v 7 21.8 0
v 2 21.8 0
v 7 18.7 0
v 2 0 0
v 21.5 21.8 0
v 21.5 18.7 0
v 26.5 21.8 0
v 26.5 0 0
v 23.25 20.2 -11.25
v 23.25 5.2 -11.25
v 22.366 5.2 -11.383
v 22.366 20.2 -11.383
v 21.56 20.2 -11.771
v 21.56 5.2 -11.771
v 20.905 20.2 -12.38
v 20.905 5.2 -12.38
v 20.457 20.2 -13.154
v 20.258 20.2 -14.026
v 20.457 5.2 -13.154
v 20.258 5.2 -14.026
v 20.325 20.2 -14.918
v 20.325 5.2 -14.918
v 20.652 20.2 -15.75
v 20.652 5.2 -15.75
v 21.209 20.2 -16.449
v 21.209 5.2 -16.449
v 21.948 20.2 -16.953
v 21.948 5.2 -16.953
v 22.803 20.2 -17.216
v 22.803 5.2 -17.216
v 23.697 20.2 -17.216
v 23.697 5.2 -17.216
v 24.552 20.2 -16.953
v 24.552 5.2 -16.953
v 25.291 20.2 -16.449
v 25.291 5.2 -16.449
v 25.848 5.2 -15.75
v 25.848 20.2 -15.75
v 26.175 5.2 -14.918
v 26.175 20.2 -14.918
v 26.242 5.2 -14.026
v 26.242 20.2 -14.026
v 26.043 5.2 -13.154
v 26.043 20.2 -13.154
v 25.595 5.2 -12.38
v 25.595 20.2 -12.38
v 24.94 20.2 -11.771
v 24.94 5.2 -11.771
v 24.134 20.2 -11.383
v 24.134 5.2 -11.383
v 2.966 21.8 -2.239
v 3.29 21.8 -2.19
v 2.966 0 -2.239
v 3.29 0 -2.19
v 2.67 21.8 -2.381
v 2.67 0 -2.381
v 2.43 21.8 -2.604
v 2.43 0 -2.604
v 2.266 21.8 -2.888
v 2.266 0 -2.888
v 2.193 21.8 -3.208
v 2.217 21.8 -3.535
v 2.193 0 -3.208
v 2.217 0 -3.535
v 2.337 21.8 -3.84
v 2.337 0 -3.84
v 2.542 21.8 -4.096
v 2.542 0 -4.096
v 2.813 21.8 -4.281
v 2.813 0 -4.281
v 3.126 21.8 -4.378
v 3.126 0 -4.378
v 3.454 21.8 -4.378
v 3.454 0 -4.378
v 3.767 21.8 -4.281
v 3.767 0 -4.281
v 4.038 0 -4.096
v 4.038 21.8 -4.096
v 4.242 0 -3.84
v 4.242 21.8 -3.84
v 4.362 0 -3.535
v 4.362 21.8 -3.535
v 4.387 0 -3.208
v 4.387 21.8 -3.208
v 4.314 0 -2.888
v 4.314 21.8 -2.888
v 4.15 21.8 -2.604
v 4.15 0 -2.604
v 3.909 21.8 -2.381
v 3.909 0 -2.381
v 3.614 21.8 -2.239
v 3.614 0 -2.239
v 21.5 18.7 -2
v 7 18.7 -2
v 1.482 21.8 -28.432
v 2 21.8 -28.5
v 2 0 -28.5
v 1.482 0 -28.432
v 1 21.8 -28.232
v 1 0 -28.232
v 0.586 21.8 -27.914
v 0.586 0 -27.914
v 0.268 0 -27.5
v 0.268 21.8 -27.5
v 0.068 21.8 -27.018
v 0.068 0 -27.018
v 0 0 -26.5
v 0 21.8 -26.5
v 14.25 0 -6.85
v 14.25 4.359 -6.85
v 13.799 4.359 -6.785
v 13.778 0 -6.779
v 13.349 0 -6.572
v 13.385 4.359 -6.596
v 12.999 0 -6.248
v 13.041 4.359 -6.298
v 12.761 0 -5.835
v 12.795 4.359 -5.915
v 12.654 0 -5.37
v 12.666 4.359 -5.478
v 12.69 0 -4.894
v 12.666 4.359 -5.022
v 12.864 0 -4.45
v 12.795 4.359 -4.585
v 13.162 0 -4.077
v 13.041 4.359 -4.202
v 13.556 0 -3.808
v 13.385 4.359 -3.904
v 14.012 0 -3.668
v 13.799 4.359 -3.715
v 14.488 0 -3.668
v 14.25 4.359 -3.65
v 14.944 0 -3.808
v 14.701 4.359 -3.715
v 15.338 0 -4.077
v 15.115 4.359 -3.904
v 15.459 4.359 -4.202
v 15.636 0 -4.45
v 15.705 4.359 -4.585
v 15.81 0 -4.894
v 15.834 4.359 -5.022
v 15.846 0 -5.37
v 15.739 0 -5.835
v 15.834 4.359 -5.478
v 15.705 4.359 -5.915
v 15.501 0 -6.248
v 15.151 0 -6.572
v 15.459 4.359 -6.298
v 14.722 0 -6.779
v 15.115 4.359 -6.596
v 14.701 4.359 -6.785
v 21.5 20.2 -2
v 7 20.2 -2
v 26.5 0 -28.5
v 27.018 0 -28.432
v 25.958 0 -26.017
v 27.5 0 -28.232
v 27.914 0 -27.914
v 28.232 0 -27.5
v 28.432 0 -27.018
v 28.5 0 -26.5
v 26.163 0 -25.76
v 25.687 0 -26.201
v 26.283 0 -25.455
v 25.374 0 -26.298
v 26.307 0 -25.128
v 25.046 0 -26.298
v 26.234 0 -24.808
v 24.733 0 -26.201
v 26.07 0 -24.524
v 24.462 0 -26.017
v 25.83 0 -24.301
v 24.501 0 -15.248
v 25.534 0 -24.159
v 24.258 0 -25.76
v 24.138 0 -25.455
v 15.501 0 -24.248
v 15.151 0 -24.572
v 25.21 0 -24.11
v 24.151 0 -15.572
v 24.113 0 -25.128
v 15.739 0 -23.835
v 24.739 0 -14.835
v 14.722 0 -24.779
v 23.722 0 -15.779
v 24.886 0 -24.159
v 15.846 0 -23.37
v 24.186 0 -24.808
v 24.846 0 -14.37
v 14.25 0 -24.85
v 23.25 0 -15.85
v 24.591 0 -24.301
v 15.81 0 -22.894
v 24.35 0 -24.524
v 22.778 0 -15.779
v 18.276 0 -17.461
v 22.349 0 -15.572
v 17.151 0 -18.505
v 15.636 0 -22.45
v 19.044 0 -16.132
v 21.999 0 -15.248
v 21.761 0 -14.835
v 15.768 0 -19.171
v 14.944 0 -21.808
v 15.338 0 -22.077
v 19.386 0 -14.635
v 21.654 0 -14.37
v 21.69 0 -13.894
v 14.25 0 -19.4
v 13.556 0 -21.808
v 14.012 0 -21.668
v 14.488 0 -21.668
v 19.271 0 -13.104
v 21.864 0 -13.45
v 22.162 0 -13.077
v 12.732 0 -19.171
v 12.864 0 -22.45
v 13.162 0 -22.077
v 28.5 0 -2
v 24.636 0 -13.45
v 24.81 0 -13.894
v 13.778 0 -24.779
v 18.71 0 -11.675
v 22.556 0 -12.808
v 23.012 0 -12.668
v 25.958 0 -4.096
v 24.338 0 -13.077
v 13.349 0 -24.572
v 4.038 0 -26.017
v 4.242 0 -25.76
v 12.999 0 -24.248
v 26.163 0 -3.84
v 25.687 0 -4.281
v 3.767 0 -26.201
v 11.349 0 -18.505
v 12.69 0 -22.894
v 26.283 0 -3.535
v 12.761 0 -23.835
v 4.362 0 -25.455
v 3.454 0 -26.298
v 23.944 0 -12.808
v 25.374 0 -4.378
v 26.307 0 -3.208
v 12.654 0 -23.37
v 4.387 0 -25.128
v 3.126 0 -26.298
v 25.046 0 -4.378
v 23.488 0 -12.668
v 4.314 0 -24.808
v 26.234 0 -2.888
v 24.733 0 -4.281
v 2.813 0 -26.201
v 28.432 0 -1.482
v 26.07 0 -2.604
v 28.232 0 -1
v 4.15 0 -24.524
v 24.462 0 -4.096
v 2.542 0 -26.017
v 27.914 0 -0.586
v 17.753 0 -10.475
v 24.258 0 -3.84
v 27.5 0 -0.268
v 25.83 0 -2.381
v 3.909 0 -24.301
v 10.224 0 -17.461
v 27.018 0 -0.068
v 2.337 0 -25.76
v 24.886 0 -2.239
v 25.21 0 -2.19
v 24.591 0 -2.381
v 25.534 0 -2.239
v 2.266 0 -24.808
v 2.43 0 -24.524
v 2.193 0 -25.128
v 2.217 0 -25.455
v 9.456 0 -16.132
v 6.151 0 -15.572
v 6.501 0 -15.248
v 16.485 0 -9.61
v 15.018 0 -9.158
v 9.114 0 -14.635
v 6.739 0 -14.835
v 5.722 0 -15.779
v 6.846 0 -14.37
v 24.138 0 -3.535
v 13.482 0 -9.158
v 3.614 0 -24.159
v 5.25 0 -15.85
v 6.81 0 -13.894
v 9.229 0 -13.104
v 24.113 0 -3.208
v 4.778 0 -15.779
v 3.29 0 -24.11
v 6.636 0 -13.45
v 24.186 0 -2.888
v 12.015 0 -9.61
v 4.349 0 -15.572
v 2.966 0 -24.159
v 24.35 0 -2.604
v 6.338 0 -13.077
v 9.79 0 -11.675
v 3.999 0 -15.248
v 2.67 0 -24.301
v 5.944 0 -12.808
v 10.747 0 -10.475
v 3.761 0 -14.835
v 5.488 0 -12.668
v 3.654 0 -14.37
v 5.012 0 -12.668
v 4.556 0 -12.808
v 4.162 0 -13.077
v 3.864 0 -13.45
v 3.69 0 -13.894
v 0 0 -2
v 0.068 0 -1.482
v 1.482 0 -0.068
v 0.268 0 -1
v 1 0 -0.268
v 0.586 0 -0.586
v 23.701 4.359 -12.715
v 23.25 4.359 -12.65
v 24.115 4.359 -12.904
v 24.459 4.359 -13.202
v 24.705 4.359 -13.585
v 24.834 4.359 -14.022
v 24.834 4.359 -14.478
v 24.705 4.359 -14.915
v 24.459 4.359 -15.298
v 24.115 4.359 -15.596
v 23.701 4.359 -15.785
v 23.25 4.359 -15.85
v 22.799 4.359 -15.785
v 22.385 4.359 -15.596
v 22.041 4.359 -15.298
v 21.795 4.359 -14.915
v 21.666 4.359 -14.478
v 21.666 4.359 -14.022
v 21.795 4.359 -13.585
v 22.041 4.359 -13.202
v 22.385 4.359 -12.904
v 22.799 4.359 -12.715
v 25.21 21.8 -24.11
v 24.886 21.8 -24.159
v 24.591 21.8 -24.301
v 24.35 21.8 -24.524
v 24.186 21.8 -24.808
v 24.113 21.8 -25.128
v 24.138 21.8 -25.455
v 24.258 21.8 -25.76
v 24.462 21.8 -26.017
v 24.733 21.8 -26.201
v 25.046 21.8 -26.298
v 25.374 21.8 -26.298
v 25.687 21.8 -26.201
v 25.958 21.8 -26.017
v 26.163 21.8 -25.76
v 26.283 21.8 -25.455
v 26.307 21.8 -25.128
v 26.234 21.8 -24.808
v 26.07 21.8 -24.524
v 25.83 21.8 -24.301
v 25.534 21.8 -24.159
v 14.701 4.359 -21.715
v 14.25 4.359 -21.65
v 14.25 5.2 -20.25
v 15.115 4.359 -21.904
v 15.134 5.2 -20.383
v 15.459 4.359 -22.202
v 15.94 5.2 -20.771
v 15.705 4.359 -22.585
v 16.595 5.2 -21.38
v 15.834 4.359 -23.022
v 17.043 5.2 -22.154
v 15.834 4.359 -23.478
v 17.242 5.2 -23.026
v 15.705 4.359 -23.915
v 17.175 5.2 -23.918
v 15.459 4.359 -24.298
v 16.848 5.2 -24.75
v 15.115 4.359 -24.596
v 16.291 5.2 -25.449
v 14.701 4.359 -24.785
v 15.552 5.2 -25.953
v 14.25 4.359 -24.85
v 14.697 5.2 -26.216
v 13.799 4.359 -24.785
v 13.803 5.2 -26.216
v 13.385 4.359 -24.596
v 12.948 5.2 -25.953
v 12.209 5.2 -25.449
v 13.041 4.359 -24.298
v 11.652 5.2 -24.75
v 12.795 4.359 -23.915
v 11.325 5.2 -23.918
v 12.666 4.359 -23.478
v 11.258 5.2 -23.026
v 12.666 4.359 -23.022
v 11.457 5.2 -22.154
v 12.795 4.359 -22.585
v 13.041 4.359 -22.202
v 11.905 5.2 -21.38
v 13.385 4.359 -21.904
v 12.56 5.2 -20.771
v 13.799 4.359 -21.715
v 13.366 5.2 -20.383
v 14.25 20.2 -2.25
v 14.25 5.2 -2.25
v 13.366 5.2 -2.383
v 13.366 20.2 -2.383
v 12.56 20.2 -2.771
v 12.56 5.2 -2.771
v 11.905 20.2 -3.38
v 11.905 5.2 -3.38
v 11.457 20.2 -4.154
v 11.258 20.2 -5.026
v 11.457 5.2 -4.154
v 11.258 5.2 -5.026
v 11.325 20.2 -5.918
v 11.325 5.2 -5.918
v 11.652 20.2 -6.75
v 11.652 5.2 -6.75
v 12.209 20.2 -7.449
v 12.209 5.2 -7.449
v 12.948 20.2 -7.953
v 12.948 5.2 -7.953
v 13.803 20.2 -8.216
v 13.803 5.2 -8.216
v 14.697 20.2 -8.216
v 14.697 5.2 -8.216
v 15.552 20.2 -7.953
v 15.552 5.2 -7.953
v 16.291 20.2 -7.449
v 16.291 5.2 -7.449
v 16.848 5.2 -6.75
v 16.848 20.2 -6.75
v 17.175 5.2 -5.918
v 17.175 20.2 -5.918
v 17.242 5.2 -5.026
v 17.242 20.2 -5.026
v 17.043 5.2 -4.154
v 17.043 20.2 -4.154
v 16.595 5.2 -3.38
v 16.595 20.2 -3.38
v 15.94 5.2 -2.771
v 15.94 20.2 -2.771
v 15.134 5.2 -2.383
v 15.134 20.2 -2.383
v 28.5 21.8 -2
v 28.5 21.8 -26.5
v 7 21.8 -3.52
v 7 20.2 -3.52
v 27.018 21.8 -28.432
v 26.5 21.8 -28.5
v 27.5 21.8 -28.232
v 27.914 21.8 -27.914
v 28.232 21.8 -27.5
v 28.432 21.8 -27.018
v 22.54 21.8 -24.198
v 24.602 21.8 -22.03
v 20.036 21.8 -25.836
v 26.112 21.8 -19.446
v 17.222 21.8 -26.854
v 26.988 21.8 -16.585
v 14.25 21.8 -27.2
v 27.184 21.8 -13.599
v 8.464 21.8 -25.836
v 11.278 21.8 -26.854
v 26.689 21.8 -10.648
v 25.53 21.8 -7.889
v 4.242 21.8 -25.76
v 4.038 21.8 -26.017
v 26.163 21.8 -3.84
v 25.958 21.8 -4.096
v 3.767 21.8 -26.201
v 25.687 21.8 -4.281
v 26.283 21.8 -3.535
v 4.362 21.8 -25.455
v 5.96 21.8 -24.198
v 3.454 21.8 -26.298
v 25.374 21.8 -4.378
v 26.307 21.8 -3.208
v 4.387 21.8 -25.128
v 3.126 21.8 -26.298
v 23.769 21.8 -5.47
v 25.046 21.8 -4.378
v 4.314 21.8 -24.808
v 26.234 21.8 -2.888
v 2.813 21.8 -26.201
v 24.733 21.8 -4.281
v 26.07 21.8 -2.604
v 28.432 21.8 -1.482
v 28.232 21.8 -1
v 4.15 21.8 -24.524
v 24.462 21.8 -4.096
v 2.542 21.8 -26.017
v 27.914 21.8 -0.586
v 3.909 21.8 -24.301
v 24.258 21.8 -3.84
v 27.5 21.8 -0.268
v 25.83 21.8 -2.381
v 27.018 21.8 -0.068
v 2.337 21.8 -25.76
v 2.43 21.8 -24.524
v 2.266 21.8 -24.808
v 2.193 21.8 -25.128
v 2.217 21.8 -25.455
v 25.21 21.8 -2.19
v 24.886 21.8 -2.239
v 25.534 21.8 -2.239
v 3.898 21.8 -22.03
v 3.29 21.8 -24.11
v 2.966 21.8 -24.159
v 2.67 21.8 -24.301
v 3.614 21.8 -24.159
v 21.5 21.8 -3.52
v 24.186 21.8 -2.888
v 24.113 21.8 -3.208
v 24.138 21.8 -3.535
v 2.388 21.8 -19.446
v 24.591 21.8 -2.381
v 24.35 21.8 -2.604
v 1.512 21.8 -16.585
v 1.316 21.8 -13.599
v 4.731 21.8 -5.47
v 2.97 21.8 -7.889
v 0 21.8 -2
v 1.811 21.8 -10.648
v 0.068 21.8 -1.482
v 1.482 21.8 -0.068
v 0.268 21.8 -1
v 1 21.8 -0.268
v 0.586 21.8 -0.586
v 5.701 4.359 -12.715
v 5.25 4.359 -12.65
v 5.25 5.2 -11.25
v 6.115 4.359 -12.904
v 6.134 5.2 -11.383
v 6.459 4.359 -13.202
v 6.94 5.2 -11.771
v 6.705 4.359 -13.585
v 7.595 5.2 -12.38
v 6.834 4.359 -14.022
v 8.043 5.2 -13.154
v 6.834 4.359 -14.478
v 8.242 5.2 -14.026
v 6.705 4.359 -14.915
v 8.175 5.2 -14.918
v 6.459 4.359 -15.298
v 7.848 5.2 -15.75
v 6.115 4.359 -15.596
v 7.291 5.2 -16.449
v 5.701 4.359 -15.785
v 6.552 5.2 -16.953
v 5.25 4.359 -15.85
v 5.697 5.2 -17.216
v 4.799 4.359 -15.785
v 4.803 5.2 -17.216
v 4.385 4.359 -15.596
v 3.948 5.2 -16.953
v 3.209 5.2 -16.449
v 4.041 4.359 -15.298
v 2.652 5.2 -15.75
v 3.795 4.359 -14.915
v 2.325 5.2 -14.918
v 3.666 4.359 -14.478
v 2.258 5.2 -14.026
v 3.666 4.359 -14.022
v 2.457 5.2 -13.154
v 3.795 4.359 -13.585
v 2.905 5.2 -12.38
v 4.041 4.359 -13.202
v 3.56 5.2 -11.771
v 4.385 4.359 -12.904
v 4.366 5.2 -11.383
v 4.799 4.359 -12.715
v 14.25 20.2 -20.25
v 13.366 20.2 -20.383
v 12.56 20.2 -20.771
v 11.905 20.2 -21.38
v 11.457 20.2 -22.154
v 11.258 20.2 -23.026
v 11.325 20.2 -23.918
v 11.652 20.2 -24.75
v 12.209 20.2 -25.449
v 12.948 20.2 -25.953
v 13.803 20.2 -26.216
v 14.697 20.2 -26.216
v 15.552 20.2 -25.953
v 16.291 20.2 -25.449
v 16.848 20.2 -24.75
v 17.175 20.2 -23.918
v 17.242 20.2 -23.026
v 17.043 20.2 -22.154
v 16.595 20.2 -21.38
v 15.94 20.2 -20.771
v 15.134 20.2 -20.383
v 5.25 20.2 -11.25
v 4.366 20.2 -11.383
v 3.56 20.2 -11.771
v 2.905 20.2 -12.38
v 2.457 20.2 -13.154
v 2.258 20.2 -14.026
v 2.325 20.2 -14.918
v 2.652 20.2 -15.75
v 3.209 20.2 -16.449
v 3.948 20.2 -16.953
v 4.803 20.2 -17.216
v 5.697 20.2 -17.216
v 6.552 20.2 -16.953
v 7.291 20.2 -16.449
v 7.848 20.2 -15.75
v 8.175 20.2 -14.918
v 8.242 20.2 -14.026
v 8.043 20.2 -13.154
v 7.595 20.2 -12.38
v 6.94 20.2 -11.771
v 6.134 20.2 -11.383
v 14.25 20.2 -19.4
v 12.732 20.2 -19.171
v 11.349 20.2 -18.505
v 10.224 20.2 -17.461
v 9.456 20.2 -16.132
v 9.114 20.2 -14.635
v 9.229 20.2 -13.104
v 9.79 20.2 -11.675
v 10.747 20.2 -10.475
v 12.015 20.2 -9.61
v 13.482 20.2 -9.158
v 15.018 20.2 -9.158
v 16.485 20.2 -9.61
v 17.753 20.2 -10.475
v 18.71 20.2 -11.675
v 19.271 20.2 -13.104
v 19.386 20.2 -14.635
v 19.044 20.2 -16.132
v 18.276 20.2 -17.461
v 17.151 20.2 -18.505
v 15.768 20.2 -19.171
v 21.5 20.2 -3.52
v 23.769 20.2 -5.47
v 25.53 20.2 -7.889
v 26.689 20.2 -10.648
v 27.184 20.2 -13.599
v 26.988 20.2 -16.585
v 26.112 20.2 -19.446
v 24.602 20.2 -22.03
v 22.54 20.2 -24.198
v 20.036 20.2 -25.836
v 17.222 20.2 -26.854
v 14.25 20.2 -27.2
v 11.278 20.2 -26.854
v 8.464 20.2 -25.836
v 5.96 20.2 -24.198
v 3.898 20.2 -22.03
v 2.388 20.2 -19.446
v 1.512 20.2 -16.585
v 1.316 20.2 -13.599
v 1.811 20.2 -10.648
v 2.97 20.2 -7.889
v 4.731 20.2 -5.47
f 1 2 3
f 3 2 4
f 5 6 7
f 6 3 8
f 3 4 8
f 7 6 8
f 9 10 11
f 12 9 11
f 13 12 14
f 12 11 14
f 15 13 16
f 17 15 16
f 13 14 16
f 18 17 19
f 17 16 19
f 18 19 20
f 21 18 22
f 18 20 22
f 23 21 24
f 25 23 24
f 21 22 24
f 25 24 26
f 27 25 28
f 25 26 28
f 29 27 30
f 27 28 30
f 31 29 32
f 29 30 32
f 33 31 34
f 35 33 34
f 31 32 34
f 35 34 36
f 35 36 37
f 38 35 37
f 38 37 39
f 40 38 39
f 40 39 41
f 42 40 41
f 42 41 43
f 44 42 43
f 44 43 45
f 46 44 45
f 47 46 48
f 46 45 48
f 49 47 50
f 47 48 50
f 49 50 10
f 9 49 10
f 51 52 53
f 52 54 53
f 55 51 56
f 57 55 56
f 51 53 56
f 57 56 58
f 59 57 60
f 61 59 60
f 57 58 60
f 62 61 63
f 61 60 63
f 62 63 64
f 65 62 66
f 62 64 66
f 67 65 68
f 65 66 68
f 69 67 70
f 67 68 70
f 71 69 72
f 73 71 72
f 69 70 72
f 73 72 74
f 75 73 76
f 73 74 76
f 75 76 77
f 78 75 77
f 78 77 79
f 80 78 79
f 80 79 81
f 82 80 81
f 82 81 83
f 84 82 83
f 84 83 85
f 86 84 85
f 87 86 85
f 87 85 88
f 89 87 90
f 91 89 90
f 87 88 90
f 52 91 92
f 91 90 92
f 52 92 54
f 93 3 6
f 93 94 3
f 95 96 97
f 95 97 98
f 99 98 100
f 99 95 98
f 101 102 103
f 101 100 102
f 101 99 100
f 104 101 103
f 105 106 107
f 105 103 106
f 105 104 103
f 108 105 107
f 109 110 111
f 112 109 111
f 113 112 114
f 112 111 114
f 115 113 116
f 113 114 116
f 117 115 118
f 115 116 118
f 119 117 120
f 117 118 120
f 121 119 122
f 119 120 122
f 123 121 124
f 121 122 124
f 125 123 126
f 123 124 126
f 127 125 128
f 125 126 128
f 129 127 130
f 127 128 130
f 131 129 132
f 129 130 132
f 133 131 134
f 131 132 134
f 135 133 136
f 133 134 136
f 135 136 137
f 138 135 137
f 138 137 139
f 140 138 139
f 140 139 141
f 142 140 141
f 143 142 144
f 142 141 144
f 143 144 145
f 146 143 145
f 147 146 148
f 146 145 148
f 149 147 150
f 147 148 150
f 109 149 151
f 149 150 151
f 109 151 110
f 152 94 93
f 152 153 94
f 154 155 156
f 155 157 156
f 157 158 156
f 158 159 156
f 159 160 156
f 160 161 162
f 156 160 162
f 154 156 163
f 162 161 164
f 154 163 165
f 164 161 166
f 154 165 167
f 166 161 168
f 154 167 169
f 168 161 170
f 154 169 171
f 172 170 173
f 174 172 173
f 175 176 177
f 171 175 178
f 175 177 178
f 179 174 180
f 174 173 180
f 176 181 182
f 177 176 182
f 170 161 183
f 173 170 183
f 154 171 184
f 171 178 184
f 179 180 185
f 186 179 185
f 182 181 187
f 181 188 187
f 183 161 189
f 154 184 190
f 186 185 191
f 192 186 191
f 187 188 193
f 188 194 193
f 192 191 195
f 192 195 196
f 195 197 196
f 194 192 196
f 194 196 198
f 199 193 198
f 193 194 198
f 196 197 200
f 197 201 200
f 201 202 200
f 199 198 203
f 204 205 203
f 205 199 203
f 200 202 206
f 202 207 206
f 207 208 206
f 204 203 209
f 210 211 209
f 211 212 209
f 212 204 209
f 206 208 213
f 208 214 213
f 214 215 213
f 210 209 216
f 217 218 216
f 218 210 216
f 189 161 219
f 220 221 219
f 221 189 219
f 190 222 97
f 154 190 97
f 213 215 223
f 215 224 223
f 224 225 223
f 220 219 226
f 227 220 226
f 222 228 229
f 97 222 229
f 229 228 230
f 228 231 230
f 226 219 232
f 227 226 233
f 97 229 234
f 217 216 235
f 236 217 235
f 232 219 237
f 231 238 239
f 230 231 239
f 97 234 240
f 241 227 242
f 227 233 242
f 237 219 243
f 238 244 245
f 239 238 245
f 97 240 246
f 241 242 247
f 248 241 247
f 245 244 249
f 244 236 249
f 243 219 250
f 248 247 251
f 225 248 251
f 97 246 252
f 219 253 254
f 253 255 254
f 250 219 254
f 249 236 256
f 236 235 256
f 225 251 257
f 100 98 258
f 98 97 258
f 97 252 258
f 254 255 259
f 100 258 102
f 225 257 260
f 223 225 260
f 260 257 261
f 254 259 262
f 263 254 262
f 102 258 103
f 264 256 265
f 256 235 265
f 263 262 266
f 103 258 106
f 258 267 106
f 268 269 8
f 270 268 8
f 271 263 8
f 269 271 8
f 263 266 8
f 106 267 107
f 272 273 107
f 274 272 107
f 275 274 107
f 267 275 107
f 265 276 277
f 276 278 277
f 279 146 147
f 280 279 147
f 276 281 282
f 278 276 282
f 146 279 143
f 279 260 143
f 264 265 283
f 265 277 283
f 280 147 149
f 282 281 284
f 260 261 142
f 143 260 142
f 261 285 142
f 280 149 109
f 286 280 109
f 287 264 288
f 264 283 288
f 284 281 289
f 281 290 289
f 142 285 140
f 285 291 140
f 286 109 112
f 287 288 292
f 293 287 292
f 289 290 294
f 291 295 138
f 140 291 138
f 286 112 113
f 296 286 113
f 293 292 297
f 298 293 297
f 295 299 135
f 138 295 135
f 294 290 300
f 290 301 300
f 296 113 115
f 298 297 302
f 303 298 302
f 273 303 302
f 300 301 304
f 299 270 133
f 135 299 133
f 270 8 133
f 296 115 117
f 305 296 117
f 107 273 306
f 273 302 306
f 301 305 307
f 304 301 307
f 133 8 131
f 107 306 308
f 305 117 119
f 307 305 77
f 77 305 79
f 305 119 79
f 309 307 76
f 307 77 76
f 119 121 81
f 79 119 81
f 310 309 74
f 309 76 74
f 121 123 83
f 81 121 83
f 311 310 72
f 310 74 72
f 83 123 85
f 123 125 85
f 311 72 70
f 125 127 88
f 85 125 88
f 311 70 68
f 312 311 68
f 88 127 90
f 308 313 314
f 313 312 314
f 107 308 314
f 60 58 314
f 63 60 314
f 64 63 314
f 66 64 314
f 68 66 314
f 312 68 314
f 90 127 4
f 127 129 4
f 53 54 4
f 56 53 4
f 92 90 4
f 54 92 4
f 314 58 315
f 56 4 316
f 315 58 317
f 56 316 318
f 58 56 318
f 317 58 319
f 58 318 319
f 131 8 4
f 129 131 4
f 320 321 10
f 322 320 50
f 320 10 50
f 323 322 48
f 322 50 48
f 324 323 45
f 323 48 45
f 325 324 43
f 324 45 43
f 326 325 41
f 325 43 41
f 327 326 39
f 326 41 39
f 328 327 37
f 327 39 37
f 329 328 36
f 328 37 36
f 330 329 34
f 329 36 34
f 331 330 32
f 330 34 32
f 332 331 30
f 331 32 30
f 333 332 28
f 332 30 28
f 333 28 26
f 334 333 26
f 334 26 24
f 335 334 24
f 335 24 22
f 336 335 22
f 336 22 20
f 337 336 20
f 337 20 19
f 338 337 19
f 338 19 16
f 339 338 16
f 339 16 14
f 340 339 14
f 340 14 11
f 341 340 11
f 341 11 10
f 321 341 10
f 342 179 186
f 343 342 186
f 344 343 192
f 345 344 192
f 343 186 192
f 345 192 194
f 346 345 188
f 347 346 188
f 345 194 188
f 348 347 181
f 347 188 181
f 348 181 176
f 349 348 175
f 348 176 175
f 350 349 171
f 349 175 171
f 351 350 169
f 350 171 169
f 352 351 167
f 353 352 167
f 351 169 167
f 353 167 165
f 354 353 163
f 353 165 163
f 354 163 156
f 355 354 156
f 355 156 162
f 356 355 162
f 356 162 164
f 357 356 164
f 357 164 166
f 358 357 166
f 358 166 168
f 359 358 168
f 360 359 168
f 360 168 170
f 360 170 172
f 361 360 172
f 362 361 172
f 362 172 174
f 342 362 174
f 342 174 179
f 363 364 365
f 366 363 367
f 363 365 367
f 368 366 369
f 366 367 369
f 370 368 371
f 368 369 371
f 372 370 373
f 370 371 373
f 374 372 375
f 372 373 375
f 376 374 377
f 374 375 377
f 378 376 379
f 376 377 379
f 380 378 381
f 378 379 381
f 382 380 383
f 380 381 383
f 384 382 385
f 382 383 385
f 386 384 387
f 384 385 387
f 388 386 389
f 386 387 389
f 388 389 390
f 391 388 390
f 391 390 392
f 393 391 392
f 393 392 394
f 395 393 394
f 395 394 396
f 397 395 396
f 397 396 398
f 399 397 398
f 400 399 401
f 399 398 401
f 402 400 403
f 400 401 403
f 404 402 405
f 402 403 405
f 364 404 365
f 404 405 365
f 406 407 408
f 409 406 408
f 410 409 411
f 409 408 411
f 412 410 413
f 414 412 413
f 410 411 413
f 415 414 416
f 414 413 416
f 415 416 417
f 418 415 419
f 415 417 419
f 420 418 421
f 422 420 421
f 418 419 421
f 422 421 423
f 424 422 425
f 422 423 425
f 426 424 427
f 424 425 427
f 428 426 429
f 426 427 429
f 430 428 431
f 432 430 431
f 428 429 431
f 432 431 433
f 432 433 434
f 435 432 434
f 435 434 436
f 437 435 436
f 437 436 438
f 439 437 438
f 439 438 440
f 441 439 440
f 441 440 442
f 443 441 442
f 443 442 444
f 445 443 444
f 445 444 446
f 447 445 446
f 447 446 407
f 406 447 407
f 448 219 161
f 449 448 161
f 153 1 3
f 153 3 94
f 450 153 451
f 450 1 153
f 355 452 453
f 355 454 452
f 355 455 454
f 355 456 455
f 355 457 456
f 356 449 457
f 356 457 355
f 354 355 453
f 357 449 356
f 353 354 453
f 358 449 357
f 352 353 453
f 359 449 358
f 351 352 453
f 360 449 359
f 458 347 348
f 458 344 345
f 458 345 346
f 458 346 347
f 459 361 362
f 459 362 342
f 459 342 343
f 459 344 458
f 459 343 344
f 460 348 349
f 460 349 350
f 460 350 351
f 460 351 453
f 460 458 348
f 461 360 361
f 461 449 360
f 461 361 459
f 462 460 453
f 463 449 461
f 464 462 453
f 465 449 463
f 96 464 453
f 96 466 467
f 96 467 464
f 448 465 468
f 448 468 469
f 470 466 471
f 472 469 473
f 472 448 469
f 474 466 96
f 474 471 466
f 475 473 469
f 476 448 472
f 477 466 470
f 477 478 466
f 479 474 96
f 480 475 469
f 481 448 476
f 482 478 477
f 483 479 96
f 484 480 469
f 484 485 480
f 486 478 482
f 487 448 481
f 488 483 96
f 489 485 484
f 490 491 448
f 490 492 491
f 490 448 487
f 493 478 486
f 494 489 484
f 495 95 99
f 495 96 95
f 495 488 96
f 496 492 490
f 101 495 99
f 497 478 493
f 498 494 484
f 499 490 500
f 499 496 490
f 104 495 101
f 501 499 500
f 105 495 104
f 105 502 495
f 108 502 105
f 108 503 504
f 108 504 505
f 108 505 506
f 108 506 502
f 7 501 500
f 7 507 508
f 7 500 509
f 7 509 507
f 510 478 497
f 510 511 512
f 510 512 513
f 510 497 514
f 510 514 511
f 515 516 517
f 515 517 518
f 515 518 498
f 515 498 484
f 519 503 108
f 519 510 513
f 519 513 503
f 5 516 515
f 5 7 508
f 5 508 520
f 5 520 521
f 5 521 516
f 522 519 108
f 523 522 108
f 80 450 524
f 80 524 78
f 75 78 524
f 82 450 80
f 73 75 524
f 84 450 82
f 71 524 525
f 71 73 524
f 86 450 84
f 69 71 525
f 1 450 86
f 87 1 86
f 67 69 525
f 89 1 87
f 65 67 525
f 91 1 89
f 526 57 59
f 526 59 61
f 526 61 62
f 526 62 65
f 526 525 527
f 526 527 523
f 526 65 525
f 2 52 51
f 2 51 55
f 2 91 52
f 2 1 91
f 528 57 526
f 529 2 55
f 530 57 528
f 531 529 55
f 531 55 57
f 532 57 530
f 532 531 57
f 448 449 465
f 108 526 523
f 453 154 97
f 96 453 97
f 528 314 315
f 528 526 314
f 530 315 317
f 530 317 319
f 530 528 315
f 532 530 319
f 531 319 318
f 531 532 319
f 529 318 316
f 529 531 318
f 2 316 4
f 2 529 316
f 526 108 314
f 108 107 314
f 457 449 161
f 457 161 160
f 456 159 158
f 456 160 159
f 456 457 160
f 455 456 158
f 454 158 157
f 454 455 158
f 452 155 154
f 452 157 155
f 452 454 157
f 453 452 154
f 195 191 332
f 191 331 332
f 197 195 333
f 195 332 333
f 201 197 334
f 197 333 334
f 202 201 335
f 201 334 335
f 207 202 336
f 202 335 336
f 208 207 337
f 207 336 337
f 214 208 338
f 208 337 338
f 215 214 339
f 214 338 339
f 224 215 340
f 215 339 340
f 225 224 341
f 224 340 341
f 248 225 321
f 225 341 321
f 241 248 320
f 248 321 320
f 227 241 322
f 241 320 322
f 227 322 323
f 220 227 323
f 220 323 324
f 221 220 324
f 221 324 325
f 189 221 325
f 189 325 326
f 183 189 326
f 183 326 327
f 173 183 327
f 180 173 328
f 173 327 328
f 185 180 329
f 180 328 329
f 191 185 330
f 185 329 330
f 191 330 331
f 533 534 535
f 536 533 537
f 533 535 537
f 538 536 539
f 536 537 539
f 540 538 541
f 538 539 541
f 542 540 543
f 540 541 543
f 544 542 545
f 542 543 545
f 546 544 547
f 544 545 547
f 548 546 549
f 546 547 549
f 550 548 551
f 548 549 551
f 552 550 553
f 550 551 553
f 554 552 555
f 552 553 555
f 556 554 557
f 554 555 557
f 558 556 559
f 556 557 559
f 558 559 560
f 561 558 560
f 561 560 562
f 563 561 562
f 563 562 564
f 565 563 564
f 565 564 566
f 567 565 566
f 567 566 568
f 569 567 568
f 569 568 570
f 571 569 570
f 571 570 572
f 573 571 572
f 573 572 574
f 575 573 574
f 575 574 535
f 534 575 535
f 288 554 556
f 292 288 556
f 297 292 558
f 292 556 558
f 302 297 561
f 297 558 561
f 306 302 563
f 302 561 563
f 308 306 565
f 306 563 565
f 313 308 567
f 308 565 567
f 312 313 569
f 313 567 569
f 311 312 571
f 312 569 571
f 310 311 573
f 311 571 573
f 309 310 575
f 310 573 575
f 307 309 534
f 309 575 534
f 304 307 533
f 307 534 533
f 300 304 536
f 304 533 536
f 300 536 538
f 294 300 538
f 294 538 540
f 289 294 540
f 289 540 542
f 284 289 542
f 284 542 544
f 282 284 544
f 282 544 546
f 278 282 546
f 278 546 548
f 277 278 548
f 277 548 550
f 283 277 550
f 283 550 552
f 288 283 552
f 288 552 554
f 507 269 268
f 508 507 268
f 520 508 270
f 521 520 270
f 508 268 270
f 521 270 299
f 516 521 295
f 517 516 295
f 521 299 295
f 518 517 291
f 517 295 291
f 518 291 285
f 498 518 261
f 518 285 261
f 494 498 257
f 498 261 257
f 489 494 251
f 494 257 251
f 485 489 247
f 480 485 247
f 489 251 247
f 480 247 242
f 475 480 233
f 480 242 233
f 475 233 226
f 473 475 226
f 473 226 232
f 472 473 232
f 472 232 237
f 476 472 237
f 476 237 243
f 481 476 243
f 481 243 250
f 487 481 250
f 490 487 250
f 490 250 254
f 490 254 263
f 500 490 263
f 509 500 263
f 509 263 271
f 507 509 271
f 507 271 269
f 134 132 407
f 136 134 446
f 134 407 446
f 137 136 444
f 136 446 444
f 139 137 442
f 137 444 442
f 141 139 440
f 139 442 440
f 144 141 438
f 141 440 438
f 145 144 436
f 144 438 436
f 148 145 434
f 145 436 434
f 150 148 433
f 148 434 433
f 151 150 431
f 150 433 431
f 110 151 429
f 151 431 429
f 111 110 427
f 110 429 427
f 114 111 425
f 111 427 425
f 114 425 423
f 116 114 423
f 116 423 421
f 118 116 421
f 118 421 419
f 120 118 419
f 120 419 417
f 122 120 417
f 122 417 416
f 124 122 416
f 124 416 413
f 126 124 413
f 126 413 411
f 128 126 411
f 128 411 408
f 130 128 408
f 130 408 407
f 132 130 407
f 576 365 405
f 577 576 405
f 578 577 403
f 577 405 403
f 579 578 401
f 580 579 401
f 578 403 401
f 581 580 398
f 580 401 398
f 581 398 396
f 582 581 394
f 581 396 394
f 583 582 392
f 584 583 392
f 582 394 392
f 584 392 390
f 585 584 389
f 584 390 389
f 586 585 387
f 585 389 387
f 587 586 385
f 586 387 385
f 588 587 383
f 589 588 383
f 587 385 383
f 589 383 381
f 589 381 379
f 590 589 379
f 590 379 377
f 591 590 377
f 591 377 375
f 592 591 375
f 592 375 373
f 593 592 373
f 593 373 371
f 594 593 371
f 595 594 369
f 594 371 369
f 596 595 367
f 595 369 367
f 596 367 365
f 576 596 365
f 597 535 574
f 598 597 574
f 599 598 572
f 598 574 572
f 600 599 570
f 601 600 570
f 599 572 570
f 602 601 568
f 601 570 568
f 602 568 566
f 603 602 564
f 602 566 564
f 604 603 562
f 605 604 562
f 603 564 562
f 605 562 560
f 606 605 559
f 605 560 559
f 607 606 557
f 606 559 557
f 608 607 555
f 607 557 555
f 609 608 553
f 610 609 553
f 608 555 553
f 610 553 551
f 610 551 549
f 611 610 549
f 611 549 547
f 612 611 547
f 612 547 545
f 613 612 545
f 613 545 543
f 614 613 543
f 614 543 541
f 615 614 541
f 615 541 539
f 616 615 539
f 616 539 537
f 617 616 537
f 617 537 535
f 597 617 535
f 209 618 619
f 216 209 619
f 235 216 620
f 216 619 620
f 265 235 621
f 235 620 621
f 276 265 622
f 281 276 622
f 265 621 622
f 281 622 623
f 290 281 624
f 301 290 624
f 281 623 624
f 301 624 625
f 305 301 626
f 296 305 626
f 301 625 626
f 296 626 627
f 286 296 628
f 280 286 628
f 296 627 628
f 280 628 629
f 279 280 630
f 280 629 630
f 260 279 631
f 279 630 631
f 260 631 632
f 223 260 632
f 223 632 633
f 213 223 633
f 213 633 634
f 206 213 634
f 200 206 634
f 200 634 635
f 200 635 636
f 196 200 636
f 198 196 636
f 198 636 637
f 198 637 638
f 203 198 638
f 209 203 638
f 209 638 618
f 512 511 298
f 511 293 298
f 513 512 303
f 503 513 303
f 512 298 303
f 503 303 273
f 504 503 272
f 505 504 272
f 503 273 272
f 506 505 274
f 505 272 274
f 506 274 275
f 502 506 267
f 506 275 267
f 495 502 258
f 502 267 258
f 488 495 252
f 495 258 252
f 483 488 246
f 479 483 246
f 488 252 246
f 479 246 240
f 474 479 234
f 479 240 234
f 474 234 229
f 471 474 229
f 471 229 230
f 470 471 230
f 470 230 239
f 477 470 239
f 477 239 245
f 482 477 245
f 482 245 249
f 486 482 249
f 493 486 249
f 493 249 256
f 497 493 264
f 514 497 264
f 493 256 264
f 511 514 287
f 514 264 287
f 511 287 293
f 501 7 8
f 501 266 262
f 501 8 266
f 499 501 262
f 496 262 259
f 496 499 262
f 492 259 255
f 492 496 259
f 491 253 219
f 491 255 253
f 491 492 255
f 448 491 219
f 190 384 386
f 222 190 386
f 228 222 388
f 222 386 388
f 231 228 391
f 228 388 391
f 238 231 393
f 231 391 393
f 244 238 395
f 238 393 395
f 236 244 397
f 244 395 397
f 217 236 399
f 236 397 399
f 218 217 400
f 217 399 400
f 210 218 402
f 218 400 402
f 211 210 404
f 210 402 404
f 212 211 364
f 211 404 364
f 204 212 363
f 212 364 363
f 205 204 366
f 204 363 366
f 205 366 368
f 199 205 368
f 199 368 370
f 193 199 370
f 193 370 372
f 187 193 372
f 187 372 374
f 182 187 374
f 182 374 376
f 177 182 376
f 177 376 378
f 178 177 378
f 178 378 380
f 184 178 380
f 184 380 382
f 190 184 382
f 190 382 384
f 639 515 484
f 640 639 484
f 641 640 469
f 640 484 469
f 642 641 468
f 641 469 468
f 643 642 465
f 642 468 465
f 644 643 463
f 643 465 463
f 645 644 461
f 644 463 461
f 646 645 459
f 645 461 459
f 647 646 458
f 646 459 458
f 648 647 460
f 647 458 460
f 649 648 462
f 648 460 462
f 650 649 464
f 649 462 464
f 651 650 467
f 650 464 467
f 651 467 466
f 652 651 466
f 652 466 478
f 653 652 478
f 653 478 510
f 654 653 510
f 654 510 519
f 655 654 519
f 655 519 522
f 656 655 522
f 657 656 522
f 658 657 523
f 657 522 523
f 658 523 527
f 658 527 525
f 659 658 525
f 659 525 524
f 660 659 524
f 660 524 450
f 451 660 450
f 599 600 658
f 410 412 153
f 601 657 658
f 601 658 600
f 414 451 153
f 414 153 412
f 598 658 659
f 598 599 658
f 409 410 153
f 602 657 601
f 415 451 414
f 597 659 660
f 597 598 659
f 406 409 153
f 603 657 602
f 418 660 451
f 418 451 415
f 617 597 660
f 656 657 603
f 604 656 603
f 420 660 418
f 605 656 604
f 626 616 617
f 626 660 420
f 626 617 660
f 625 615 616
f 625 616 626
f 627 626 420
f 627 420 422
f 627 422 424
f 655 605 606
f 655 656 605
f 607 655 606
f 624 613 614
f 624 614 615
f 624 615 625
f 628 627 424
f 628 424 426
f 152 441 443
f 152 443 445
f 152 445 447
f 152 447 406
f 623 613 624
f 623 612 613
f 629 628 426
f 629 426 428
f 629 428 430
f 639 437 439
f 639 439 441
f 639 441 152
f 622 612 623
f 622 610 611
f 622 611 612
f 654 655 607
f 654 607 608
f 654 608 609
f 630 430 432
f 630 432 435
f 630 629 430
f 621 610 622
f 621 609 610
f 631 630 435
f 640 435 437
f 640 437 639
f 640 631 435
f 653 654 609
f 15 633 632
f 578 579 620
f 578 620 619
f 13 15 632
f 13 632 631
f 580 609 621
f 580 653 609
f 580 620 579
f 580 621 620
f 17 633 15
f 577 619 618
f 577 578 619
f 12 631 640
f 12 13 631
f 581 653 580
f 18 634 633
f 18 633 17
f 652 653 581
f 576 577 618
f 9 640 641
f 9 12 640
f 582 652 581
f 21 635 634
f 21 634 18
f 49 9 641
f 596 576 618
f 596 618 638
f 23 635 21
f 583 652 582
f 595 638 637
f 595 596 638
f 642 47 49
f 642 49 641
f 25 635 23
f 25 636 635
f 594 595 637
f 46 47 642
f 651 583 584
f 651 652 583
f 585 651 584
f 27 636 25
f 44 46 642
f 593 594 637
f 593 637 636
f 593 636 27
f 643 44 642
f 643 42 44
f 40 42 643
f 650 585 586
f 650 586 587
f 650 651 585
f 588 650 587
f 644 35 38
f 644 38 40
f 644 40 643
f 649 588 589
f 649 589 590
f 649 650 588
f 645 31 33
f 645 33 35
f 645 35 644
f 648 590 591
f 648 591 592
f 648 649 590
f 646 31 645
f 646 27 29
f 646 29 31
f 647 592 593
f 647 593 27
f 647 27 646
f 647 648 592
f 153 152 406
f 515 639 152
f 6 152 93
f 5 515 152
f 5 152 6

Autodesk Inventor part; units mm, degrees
ref_plane "YZ Plane" through (0, 0, 0) normal (1, 0, 0) x (0, 1, 0)
ref_plane "XZ Plane" through (0, 0, 0) normal (0, 1, 0) x (-1, 0, 0)
ref_plane "XY Plane" through (0, 0, 0) normal (0, 0, 1) x (1, 0, 0)
sketch "スケッチ4" plane through (0, 0, 0) normal (0, 1, 0) x (-1, 0, 0)
  line L0 (0, 0) -> (-28.5, 0)
  line L1 (-28.5, 0) -> (-28.5, -28.5)
  line L2 (-28.5, -28.5) -> (0, -28.5)
  line L3 (0, -28.5) -> (0, 0)
  dimension "d6" = 28.5
  dimension "d7" = 28.5
extrude "押し出し2" add sketch "スケッチ4" along normal blind 21.8
sketch "スケッチ5" plane through (0, 21.8, 0) normal (0, 1, 0) x (1, 0, 0)
  circle A0 centre (14.25, 14.25) radius 12.95
  line L0 (0, 28.5) -> (0, 0) projected
  line L1 (28.5, 28.5) -> (0, 28.5) projected
  line L2 (7, 3.5197) -> (21.5, 3.5197)
  line L3 (21.5, 3.5197) -> (21.5, -0.843)
  line L4 (21.5, -0.843) -> (7, -0.843)
  line L5 (7, -0.843) -> (7, 3.5197)
  point P0 (0, 14.25)
  point P1 (14.25, 28.5)
  point P2 (7, 1.3383)
  point P3 (21.5, 3.5197)
  dimension "d10" = 25.9
  dimension "d28" = 14.5
  dimension "d29" = 7.25
sketch "スケッチ6" plane through (0, 21.8, 0) normal (0, 1, 0) x (1, 0, 0)
  circle A0 centre (14.25, 14.25) radius 12.95 projected
  line L0 (28.5, 0) -> (28.5, 28.5) construction
  line L1 (28.5, 28.5) -> (0, 28.5) construction
  line L2 (0, 0) -> (28.5, 0) construction
  circle A1 centre (24.5802, 2.4198) radius 0 construction
  circle A2 centre (14.25, 14.25) radius 15.5 construction
  line L3 (28.5, 0) -> (0, 28.5) construction
  line L4 (0, 28.5) -> (0, 0) construction
  line L5 (0, 0) -> (28.5, 28.5) construction
  point P0 (24.5802, 2.4198)
  point P1 (3.2898, 3.2898)
  point P2 (3.2898, 25.2102)
  point P3 (25.2102, 25.2102)
  point P4 (25.2102, 3.2898)
  dimension "d61" = 31
fillet "フィレット1" radius 2 4 edges at (0, 10.9, -28.5) (0, 10.9, 0) (28.5, 10.9, 0) (28.5, 10.9, -28.5)
extrude "押し出し3" cut sketch "スケッチ5" against normal blind 1.6
sketch "スケッチ7" plane through (0, 0, 0) normal (0, -1, 0) x (1, 0, 0)
  line L0 (0, -26.5) -> (0, -2) projected
  line L1 (26.5, -28.5) -> (2, -28.5) projected
  point P0 (0, 0)
  point P1 (14.25, -14.25)
  point P2 (0, -14.25)
  point P3 (14.25, -28.5)
hole "穴3" at (14.25, 0, -14.25) direction (0, 1, 0) diameter 10.3 end through all
sketch "スケッチ8" plane through (0, 0, 0) normal (0, -1, 0) x (1, 0, 0)
  line L0 (0, -26.5) -> (0, -2) projected
  line L1 (26.5, -28.5) -> (2, -28.5) projected
  circle A0 centre (14.25, -14.25) radius 9
  point P0 (0, 0)
  point P1 (0, -14.25)
  point P2 (14.25, -28.5)
  point P3 (14.25, -23.25)
  point P4 (5.25, -14.25)
  point P5 (14.25, -5.25)
  point P6 (23.25, -14.25)
  dimension "d39" = 18
hole "穴4" at (14.25, 0, -14.25) at (14.25, 0, -23.25) at (5.25, 0, -14.25) at (14.25, 0, -5.25) at (23.25, 0, -14.25) direction (0, 1, 0) diameter 3.2 end through all
sketch "スケッチ9" plane through (0, 20.2, 0) normal (0, 1, 0) x (1, 0, 0)
  circle A0 centre (14.25, 5.25) radius 1.6 projected
  circle A1 centre (5.25, 14.25) radius 1.6 projected
  circle A2 centre (14.25, 23.25) radius 1.6 projected
  circle A3 centre (23.25, 14.25) radius 1.6 projected
  point P0 (0, 0)
hole "穴5" at (14.25, 20.2, -5.25) at (5.25, 20.2, -14.25) at (14.25, 20.2, -23.25) at (23.25, 20.2, -14.25) direction (0, -1, 0) diameter 6 depth 15 tip angle 118
sketch "スケッチ10" plane through (0, 21.8, 0) normal (0, 1, 0) x (1, 0, 0)
  circle A0 centre (24.5802, 2.4198) radius 1.1 projected
  circle A1 centre (2.4198, 2.4198) radius 1.1 projected
  circle A2 centre (2.4198, 24.5802) radius 1.1 projected
  circle A3 centre (24.5802, 24.5802) radius 1.1 projected
  point P0 (0, 0)
hole "穴6" [suppressed]
hole "穴7" at (3.2898, 21.8, -3.2898) at (3.2898, 21.8, -25.2102) at (25.2102, 21.8, -25.2102) at (25.2102, 21.8, -3.2898) direction (0, -1, 0) diameter 2.2 end through all
sketch "スケッチ11" plane through (0, 20.2, 0) normal (0, 1, 0) x (1, 0, 0)
  line L0 (7, 0) -> (7, 3.5197) projected
  line L1 (21.5, 0) -> (7, 0)
  line L2 (7, 0) -> (7, 2)
  line L3 (7, 2) -> (21.5, 2)
  line L4 (21.5, 2) -> (21.5, 0)
  point P0 (7, 0)
  dimension "d72" = 2
extrude "押し出し5" cut sketch "スケッチ11" against normal blind 1.5
properties part number "NewPart1_for_shoulder"
